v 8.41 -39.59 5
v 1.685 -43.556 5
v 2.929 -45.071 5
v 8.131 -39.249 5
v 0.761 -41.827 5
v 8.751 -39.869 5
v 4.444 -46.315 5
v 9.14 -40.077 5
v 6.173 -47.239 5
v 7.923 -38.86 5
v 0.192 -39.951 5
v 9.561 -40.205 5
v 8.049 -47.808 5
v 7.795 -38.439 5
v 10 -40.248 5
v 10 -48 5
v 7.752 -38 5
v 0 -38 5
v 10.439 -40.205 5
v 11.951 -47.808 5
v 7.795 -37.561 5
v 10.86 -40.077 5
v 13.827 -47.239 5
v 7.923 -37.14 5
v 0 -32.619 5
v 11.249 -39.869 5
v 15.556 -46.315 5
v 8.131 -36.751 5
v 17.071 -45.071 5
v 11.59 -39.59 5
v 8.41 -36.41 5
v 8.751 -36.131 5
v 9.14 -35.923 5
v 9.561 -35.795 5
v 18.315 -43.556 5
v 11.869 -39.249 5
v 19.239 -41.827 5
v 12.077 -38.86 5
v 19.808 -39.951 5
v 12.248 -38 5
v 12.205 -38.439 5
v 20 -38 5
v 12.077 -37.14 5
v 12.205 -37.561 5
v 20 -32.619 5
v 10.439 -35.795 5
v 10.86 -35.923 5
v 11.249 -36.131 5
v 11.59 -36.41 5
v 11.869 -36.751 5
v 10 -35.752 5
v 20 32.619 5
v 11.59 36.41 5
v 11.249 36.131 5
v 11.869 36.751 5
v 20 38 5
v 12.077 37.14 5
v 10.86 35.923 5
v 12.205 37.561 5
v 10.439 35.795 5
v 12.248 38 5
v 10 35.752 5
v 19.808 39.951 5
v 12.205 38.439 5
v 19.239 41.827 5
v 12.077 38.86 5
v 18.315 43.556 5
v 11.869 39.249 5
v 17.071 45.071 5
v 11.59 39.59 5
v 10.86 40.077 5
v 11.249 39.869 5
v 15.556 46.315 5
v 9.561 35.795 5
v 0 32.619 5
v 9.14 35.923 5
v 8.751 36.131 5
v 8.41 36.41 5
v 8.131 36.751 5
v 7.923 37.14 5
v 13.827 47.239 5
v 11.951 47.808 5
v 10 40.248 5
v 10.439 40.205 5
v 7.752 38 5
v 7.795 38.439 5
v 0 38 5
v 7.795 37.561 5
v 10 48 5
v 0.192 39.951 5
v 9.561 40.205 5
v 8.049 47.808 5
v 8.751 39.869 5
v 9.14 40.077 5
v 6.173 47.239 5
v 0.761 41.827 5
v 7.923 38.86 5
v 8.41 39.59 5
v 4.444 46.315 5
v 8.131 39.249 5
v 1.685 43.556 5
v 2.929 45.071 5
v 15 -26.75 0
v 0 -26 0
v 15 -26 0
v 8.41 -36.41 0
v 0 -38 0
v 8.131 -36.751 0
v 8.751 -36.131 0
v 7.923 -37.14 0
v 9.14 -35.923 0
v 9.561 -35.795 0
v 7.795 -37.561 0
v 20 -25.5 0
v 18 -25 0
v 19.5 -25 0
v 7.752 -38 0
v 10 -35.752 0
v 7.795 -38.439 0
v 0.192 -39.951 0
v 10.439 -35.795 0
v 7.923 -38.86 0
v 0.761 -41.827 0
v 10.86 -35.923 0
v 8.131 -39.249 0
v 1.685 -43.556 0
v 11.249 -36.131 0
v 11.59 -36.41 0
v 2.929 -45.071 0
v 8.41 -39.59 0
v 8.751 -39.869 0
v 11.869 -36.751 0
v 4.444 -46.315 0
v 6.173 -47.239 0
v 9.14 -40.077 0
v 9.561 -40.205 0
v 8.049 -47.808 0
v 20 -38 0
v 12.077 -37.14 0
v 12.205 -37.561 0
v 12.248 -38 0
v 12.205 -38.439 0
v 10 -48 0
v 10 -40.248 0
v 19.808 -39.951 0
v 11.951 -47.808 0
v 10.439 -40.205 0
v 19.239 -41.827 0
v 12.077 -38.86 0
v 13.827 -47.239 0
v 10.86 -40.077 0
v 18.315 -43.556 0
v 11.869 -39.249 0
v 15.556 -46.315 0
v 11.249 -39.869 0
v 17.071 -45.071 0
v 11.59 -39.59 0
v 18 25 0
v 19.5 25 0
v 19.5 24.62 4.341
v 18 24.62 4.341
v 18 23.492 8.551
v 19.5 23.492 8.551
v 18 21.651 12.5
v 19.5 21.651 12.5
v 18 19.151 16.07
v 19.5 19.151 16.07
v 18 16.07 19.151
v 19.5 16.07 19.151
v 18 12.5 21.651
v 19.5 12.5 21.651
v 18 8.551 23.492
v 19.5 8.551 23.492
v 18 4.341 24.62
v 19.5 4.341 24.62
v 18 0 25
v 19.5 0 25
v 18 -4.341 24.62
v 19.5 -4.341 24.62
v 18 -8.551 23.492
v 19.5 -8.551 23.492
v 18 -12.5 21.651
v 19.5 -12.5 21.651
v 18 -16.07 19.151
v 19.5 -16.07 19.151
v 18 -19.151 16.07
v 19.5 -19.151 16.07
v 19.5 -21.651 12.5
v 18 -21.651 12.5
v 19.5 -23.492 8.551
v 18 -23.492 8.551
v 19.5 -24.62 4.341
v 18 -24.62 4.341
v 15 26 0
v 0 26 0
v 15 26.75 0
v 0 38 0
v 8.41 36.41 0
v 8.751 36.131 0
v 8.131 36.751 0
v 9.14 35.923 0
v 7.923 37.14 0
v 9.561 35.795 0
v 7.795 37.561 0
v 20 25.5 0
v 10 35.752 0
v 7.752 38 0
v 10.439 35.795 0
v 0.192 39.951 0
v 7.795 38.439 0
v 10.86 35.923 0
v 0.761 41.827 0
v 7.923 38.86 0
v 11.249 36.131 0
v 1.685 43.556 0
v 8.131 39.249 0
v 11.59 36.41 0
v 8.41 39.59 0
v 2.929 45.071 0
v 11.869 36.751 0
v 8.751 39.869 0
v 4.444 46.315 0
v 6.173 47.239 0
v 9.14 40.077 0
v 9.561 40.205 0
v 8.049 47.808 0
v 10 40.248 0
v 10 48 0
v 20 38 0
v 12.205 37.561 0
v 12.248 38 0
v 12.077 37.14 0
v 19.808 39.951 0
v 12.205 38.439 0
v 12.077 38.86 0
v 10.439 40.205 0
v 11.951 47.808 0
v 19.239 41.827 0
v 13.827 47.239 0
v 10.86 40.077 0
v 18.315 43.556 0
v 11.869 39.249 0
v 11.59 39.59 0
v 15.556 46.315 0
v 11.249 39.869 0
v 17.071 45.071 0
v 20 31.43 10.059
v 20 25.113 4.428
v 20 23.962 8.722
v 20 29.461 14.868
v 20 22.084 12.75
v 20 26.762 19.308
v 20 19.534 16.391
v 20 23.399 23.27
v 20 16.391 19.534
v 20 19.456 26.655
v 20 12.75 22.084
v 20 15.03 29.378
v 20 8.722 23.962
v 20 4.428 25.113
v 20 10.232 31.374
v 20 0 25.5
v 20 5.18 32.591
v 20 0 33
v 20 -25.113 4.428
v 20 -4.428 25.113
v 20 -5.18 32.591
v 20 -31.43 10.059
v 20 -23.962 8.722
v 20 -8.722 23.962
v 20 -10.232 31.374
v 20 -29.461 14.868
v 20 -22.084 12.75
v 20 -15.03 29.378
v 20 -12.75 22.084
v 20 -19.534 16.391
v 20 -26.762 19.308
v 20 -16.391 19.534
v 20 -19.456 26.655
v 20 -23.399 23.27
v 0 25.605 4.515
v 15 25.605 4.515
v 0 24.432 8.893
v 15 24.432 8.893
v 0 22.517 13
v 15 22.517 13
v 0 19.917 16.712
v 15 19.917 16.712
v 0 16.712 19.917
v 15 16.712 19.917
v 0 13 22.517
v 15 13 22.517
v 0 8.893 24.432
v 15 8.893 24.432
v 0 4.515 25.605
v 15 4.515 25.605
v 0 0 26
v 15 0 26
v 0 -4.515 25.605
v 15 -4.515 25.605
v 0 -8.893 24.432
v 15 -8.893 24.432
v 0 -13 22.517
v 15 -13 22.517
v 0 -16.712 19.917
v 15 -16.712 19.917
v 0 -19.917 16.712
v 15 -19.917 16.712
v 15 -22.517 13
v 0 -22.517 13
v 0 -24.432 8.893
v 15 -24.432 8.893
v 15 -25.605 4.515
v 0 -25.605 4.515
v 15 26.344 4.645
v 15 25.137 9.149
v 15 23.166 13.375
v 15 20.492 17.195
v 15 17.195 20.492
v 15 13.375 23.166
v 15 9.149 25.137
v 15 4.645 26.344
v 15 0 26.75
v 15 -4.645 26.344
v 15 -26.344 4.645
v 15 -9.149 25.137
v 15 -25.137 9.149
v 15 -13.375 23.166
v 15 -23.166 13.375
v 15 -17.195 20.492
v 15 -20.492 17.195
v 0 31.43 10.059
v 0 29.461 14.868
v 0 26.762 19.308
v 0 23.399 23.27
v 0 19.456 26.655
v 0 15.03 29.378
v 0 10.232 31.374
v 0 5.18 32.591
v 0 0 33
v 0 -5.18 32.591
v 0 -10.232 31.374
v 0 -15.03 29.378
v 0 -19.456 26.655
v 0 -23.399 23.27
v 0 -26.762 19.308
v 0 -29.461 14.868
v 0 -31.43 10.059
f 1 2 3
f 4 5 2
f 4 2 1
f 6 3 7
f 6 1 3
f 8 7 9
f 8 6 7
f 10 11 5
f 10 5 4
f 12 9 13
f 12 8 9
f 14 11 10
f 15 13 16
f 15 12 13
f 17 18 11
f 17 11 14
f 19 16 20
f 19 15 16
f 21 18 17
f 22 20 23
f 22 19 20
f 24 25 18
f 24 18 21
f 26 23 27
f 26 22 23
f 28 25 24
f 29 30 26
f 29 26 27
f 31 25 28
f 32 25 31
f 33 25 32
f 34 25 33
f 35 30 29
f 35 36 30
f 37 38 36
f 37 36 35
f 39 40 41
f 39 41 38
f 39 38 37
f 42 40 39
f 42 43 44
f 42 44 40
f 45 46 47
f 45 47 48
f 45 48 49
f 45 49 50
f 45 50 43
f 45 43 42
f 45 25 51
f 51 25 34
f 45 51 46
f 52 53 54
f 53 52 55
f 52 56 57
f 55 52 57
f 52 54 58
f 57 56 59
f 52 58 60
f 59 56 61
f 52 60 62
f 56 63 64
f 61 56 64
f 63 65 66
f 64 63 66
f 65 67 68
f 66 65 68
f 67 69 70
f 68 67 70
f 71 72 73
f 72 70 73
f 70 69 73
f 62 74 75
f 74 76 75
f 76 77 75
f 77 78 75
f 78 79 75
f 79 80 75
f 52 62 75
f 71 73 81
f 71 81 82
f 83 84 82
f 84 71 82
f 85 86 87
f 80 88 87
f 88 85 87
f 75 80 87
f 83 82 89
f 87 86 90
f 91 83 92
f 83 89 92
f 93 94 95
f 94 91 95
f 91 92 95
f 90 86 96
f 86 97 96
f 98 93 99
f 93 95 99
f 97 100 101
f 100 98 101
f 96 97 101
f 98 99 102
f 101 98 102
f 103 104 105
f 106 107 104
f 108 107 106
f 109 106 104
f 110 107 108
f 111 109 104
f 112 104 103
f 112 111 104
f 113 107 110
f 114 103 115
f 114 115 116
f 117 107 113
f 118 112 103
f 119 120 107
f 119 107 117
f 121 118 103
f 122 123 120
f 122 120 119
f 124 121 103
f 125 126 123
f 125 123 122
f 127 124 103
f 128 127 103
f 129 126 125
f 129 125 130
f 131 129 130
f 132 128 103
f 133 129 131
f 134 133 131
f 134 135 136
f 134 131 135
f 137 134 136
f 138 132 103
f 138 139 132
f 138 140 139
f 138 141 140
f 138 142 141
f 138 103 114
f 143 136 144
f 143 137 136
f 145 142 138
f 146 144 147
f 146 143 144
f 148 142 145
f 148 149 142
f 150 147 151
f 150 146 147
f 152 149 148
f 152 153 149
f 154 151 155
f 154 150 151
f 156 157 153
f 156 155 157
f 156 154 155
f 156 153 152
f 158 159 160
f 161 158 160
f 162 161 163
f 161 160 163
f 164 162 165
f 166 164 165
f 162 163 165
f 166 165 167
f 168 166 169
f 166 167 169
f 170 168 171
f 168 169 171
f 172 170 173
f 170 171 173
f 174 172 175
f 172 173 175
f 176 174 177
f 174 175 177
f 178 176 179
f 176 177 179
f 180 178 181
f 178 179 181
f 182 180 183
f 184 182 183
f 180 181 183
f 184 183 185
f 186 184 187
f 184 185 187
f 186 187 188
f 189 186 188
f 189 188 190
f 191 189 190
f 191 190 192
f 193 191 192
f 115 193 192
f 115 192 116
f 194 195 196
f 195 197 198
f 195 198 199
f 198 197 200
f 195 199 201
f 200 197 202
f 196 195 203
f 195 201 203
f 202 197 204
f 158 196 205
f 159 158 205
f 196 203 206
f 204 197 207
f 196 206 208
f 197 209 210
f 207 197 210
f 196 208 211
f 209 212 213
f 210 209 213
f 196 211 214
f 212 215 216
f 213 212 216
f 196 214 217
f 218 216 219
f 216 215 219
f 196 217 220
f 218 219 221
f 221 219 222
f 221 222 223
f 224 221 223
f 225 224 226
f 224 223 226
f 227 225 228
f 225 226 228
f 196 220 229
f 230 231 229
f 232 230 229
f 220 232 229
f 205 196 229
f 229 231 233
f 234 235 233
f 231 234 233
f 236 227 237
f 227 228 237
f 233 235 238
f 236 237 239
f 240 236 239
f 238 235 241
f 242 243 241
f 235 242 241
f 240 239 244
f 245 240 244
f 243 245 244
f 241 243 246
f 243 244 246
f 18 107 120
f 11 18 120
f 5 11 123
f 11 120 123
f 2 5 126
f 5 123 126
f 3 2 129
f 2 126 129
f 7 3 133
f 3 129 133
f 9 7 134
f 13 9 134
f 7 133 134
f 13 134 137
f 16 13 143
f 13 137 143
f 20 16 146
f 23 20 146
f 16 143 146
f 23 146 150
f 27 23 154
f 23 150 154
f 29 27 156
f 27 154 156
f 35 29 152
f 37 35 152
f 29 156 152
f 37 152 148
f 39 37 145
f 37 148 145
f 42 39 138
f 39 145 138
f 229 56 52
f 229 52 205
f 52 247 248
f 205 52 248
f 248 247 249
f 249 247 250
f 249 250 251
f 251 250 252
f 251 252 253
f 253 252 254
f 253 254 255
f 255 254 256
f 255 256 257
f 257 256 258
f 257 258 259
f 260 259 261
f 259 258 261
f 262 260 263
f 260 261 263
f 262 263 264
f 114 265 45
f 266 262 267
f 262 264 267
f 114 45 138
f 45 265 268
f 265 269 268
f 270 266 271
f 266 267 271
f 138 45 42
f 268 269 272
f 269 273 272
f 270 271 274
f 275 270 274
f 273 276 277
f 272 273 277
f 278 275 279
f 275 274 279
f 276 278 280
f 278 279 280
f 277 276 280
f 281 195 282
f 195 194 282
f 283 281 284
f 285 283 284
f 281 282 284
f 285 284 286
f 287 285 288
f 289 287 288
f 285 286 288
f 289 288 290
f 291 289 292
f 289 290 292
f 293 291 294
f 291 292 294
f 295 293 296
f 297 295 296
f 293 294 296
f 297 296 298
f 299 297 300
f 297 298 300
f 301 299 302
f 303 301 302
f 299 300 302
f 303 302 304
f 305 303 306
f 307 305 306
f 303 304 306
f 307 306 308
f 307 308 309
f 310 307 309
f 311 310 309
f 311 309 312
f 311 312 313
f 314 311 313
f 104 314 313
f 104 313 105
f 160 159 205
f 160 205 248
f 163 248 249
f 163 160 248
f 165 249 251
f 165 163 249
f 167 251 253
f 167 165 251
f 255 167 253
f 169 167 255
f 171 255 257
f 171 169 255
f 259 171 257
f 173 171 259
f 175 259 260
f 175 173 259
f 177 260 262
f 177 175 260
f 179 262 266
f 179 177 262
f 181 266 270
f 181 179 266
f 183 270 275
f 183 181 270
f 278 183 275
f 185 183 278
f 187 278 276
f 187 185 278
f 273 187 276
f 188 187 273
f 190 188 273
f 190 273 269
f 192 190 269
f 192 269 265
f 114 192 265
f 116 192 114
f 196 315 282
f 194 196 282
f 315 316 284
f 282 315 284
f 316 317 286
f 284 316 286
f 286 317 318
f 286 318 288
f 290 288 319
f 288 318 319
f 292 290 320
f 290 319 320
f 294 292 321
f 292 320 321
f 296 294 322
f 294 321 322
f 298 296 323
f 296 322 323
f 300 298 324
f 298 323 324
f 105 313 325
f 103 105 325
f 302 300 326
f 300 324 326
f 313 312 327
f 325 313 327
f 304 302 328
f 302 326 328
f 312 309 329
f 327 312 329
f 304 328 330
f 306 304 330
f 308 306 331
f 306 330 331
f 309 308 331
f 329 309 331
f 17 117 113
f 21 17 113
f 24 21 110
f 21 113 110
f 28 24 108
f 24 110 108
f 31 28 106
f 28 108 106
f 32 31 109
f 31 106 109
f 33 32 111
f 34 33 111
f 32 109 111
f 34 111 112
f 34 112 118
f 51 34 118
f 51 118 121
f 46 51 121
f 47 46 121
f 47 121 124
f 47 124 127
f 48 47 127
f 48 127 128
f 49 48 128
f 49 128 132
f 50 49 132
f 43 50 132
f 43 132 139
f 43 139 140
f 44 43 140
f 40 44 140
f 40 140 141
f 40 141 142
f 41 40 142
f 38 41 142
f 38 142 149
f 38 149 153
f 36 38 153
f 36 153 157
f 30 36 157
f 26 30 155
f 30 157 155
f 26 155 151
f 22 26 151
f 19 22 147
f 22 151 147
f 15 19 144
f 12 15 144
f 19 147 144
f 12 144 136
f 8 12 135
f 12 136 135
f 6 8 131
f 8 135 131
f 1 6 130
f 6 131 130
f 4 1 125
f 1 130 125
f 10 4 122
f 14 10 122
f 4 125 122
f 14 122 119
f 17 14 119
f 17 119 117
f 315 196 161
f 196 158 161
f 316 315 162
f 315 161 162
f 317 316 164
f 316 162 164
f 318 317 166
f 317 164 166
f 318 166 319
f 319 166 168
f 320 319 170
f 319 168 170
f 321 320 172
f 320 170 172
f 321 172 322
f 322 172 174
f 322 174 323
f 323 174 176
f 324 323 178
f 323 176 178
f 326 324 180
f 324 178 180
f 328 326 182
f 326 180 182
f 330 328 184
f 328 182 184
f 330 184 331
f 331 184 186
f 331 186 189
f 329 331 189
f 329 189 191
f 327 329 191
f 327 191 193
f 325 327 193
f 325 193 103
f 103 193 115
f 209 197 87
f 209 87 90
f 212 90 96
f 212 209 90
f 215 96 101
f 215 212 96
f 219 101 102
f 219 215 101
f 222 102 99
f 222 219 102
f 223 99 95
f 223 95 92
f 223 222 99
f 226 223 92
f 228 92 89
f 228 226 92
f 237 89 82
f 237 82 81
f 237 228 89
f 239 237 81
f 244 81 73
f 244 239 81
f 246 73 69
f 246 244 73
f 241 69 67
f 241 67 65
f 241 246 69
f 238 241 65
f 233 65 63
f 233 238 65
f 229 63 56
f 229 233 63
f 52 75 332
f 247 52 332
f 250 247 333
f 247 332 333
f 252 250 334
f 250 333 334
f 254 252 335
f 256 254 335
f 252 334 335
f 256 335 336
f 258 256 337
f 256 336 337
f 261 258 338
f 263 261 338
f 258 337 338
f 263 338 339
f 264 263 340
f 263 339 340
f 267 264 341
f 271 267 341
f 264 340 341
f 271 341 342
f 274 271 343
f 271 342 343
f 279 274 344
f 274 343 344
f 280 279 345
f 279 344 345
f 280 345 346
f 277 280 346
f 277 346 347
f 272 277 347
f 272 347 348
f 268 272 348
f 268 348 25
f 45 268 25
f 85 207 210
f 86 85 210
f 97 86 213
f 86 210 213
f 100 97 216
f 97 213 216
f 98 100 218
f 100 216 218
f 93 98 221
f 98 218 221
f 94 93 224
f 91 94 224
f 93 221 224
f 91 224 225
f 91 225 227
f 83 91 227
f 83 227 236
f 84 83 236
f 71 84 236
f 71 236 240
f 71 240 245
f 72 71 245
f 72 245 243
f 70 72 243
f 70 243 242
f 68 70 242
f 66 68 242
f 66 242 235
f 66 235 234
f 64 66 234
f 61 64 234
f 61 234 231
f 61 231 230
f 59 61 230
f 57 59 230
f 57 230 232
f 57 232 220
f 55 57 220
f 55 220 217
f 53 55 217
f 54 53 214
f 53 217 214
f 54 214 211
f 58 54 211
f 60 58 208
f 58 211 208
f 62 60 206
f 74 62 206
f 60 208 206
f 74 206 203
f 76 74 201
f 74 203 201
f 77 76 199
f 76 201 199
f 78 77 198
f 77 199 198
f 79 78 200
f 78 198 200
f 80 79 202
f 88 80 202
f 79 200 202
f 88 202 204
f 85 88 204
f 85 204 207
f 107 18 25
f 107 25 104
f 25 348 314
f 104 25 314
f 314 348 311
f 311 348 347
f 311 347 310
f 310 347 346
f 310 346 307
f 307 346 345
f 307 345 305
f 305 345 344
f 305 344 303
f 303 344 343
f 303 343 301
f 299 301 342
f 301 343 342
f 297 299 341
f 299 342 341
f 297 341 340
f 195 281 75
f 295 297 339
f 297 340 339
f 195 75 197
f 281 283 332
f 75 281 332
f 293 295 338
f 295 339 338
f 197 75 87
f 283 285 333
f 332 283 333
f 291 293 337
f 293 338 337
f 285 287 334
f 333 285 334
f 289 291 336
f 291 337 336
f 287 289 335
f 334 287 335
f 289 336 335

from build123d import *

# Parameters (mm, degrees)
REVOLVE1_ANGLE      = 180
BOSS_EXTRUDE3_DEPTH = 5
BOSS_EXTRUDE4_DEPTH = 5
SKETCH17_R          = 2.2479
CUT_EXTRUDE1_DEPTH  = 34
CHAMFER1_SIZE       = 0.5


with BuildPart() as part:
    # Sketch1 → Revolve1 (revolve)
    with BuildSketch(Plane.XY):
        Polygon((15, 26), (15, 26.75), (18, 25), (20, 25), (20, 33), (0, 33), (0, 26), align=None)
    revolve(axis=Axis((0, 0, 0), (1, 0, 0)), revolution_arc=REVOLVE1_ANGLE)

    # Sketch9 → Boss-Extrude3 (add)
    with BuildSketch(Plane(origin=(0, 0, 0), x_dir=(-1, 0, 0), z_dir=(0, 0, -1))):
        with BuildLine():
            Line((-20, 29), (0, 29))
            Line((0, 29), (0, 38))
            ThreePointArc((0, 38), (-10, 48), (-20, 38))
            Line((-20, 38), (-20, 29))
        make_face()
    extrude(amount=-BOSS_EXTRUDE3_DEPTH)

    # Sketch11 → Boss-Extrude4 (add)
    with BuildSketch(Plane(origin=(0, 0, 0), x_dir=(-1, 0, 0), z_dir=(0, 0, -1))):
        with BuildLine():
            Line((-20, -29), (0, -29))
            Line((0, -29), (0, -38))
            ThreePointArc((0, -38), (-10, -48), (-20, -38))
            Line((-20, -38), (-20, -29))
        make_face()
    extrude(amount=-BOSS_EXTRUDE4_DEPTH)

    # Sketch17 → Cut-Extrude1 (cut, through all)
    with BuildSketch(Plane(origin=(0, 0, 0), x_dir=(-1, 0, 0), z_dir=(0, 0, -1))):
        with Locations((-10, 38)):
            Circle(SKETCH17_R)
        with Locations((-10, -38)):
            Circle(SKETCH17_R)
    extrude(amount=-CUT_EXTRUDE1_DEPTH, mode=Mode.SUBTRACT)

    # Chamfer1
    chamfer1_edges = [part.edges().sort_by_distance(p)[0] for p in [
        (20, 0, 25),
    ]]
    chamfer(chamfer1_edges, length=CHAMFER1_SIZE)


solid = part.part
